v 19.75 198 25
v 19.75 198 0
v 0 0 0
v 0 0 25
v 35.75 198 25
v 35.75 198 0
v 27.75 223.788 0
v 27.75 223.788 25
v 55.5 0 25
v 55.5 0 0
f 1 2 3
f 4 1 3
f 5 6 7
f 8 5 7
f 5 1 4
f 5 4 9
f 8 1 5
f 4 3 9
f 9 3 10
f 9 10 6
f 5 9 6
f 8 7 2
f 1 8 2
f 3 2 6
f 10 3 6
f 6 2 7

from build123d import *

# Parameters (mm, degrees)
F1_DEPTH = 25
F2_DEPTH = 10


with BuildPart() as f1:
    # F0 (on Top) → F1 (new body)
    with BuildSketch(Plane.XY):
        Polygon((19.75, 198), (27.75, 198), (35.75, 198), (27.75, 223.787594), align=None)
        Polygon((35.75, 198), (27.75, 198), (19.75, 198), (0, 0), (55.5, 0), align=None)
    extrude(amount=F1_DEPTH)

    # F0 (on Top) → F2 (join)
    with BuildSketch(Plane.XY):
        Polygon((19.75, 198), (27.75, 198), (35.75, 198), (27.75, 223.787594), align=None)
        Polygon((35.75, 198), (27.75, 198), (19.75, 198), (0, 0), (55.5, 0), align=None)
    extrude(amount=F2_DEPTH)


solid = f1.part
